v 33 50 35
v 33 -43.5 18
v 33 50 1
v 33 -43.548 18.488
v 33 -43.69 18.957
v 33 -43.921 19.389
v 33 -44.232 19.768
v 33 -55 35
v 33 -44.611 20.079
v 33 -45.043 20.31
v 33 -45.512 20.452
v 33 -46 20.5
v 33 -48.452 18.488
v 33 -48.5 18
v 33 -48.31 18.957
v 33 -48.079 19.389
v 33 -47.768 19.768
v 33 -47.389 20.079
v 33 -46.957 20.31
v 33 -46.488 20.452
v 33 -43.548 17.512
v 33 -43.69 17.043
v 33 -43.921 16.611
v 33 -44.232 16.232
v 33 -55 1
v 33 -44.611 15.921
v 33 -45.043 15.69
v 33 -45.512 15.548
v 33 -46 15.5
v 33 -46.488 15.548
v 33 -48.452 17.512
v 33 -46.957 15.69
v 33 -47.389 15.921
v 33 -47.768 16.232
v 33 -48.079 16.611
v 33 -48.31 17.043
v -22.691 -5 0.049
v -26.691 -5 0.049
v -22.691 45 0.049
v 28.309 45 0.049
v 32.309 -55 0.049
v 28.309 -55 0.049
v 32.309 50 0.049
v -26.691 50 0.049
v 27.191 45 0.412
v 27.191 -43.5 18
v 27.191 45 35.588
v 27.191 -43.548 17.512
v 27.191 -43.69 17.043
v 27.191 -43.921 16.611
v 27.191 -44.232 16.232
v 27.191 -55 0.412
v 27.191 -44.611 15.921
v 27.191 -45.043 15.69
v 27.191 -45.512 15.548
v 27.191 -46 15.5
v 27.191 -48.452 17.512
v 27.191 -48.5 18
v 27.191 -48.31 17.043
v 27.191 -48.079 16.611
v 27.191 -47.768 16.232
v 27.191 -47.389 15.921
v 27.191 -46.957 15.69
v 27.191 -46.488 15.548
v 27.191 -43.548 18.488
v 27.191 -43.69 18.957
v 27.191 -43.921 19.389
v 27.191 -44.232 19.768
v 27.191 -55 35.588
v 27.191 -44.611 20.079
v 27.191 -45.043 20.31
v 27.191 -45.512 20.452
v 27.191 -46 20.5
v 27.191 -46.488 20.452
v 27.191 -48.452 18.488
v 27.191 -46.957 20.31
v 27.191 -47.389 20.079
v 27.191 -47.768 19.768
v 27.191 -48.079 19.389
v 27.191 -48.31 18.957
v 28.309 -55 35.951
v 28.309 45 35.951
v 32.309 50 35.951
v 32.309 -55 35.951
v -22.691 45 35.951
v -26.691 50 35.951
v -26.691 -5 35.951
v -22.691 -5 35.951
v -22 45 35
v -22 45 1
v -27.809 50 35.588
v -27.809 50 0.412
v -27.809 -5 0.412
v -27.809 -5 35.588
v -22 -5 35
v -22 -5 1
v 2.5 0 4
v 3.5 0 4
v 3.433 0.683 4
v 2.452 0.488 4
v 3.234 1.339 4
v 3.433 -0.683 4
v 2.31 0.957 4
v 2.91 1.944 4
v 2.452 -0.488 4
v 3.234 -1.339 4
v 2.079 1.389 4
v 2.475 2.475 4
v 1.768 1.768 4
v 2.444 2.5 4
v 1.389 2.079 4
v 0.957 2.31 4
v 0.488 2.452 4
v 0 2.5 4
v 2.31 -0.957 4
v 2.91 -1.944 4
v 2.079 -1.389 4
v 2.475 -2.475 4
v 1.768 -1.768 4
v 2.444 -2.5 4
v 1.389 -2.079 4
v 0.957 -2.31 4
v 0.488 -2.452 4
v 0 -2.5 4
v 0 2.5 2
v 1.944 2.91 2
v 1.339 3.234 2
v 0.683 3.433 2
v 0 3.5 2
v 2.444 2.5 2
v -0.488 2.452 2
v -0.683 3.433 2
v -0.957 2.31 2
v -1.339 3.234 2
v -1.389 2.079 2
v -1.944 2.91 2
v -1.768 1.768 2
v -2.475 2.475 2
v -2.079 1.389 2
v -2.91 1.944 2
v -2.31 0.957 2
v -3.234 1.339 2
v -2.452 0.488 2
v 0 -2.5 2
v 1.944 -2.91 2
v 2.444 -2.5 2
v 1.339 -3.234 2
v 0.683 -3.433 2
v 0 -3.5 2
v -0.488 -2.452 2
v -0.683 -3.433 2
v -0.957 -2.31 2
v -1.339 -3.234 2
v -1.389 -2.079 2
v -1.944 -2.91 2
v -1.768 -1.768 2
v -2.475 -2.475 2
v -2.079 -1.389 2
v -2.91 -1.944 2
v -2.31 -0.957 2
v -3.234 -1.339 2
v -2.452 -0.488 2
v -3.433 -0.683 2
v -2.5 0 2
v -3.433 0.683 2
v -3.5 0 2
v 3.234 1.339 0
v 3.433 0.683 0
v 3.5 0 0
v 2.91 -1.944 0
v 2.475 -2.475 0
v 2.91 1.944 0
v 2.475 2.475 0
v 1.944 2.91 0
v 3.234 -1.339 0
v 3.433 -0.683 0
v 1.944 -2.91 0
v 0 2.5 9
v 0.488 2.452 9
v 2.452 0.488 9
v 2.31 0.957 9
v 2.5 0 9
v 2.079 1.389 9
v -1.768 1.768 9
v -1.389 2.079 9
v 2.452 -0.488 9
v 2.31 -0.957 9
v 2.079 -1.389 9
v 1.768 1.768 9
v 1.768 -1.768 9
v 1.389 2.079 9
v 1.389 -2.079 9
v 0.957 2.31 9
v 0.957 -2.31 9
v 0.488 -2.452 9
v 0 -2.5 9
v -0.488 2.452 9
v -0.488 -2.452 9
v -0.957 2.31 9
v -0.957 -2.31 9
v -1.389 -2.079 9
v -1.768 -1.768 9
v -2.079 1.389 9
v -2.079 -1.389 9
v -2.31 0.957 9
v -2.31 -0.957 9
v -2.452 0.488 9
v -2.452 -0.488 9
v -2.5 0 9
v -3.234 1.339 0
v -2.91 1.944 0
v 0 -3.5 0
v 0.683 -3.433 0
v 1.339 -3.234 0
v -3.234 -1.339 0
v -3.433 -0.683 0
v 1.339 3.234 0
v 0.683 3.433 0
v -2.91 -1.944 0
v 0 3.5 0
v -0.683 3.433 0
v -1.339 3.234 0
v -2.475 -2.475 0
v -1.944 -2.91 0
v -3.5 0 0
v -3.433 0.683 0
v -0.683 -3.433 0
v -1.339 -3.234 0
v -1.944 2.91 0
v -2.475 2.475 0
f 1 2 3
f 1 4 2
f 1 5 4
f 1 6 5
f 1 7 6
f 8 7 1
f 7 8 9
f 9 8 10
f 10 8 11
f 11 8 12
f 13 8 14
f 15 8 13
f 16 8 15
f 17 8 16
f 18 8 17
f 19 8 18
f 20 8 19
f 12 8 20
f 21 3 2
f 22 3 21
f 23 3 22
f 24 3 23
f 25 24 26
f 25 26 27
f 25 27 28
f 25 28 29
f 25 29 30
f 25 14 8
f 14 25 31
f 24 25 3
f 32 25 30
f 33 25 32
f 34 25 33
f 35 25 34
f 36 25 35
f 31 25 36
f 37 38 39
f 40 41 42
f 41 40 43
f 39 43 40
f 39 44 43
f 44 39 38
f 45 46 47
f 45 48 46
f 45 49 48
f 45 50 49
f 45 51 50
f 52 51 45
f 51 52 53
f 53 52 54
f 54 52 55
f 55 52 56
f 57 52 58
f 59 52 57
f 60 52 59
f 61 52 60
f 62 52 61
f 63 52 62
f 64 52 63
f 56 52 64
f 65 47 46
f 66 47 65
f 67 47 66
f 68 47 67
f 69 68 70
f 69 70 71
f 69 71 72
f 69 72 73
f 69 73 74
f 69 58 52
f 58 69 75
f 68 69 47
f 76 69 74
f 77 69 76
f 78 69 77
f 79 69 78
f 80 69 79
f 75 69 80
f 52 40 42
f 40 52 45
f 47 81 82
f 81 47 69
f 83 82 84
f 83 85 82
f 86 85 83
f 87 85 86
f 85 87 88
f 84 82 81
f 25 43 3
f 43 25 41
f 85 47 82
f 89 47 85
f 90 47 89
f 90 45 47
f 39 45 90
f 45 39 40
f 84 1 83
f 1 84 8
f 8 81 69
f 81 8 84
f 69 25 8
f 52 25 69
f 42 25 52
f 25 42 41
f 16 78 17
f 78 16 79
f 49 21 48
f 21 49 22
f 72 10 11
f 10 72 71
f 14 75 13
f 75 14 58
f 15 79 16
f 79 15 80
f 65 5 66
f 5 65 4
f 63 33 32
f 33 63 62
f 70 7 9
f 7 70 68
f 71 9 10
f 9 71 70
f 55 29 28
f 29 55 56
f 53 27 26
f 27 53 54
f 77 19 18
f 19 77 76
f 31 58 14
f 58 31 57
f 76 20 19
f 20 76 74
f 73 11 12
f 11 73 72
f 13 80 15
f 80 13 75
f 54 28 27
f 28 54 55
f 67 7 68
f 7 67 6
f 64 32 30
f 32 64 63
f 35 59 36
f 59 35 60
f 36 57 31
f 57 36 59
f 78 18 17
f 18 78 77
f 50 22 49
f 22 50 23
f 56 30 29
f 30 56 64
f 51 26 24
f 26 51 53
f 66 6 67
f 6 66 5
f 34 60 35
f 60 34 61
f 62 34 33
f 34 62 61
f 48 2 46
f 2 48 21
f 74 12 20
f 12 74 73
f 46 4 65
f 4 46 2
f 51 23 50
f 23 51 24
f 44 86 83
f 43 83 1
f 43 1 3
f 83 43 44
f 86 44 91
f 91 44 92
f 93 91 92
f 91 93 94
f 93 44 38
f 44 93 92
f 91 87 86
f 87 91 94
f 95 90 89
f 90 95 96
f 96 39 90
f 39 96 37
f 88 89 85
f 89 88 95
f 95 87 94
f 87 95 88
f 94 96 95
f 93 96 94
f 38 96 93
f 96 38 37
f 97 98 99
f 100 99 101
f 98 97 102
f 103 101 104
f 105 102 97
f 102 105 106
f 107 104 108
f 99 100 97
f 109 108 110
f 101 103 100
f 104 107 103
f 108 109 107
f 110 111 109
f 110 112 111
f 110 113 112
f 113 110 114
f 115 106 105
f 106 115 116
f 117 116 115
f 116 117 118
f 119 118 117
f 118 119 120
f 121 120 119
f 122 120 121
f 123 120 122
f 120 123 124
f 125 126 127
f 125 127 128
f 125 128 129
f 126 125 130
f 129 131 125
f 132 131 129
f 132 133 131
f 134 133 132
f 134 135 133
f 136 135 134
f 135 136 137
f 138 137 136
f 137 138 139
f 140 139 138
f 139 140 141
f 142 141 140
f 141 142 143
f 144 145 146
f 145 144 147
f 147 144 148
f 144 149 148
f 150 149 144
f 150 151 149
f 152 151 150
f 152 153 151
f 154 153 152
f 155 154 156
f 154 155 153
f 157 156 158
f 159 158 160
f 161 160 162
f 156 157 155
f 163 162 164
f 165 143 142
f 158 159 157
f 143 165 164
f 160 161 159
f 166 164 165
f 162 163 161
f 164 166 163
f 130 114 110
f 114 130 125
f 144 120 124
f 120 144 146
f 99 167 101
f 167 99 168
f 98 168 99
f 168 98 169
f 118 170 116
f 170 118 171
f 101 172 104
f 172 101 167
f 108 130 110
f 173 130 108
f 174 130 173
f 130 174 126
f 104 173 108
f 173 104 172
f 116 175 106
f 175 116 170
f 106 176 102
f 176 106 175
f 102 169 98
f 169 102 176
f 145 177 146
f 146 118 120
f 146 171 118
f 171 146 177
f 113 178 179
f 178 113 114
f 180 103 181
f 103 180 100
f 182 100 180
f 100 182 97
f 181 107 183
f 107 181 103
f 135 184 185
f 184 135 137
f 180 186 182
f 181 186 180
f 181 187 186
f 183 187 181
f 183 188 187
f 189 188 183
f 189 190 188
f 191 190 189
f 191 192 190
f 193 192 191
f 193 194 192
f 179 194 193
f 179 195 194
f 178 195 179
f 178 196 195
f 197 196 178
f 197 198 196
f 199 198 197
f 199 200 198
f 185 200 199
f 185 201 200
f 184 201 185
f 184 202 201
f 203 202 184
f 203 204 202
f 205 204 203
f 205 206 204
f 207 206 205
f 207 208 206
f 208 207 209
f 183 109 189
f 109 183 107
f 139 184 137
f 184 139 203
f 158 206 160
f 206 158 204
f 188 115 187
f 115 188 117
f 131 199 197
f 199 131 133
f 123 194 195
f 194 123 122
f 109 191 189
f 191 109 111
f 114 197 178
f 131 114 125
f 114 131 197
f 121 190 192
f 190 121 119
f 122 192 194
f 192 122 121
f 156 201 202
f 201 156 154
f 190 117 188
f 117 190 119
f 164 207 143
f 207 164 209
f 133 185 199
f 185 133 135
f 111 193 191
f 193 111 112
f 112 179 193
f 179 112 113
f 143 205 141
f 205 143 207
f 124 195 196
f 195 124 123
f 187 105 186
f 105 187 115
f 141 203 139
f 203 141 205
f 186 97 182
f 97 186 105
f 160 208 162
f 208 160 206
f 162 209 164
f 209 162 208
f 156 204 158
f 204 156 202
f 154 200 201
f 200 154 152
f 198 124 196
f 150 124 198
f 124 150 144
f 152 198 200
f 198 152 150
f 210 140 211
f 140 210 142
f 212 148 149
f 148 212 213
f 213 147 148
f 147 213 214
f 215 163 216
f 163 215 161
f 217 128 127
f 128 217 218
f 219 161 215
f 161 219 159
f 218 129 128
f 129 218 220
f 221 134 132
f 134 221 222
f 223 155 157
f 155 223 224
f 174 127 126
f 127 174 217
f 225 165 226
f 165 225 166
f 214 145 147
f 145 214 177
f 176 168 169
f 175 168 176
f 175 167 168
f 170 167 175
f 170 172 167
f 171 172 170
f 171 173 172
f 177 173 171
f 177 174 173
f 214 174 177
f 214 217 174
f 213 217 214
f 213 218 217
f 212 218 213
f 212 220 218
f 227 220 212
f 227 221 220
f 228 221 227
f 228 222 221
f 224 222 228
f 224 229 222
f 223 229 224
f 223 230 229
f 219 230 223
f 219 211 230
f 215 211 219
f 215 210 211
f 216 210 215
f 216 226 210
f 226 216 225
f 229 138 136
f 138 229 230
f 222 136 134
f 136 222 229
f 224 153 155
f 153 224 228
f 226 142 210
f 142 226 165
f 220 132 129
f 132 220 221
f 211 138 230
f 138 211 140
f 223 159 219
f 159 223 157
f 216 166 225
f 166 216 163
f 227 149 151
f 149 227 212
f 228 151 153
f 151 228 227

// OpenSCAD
// preview[view:south west, tilt:top diagonal]

/* [General Settings] */
// How thick is the cubical wall?
wall_thickness = 50;//[15:75]

// How long should the back side be?
back_height = 50;//[15:100]

// How long should the front side be?
front_height = 100;//[30:150]

// Adjust the resolution
resolution = 32;//[16:36]
$cf=resolution;

// How wide should the hanger be?
hanger_width = 35;//[5:75]

// How thick should the plastic be?
hanger_thickness = 5;//[2:10]

/* [Hook Settings] */
// Diameter of the hook (this should be smaller than the hole for clearance).
hook_diameter = 7;//[1:25]

// Thickness of the hook (shallower than hole depth for clearance).
hook_depth = 2;//[1:10]

// Diameter of the bar (this should be smaller than the smallest part of the hole for clearance).
bar_diameter = 5;//[1:20]

// Length of the hook bar (slightly larger than keyhole material thickness).
bar_depth = 2;//[1:10]

/* [Hidden] */

edge_radius = 1;

main(); //runs program

module main(){

	translate( [-wall_thickness / 2, front_height / 2, hanger_width / 2 + edge_radius / 2] ) rotate( a=[ 90, 0, 0] ) {
		//Top
		translate( [( wall_thickness + hanger_thickness ) / 2, 0, 0] ) {
			roundedRect( size = [( wall_thickness + 2 * hanger_thickness ), hanger_width, hanger_thickness], radius = edge_radius );
		}

		//Back
		translate( [0, 0, hanger_thickness] ) {
			roundedRect( size = [hanger_thickness, hanger_width, back_height], radius = edge_radius );
		}

		//Front
		difference() {
			translate( [( wall_thickness + hanger_thickness ), 0, hanger_thickness] ) roundedRect( size = [hanger_thickness, hanger_width, front_height], radius = edge_radius );
			translate( [( wall_thickness + 1.5 * hanger_thickness + hook_depth + bar_depth ), 0, ( front_height - ( hook_diameter / 2 ) + hook_depth - 0.5 * hanger_thickness )] ) rotate(a=[0, 270, 0]) cylinder( h = bar_depth + 2 * hanger_thickness, r = ( bar_diameter / 2 ), $fn = $cf );
		}
	}

	//Hooks
	drawHook();
}

module drawHook() {

	large_radius = ( hook_diameter / 2 );
	small_radius = ( bar_diameter / 2 );

	cylinder( h = hook_depth, r1 = large_radius, r2 = large_radius, $fn = $cf );

	translate( [ 0, 0, hook_depth ] ) {

		cylinder( h = bar_depth + hanger_thickness, r1 = small_radius, r2 = small_radius, $fn = $cf );

		intersection() {

			translate( [0, -small_radius, 0] ) {
				cube( [hook_diameter, bar_diameter, bar_depth] );
			}

			cylinder( h = bar_depth, r1 = large_radius, r2 = large_radius, $fn = $cf );
		}
	}
}

module roundedRect( size, radius ) {

	x = size[0];
	y = size[1];
	z = size[2];

	linear_extrude( height = z )

	hull() {

		// place 4 circles in the corners, with the given radius
		translate( [( -x / 2 ) + ( radius / 2 ), ( -y / 2 ) + ( radius / 2 ), 0] ) circle( r = radius );

		translate( [( x / 2 ) - ( radius / 2 ), ( -y / 2 ) + ( radius / 2 ), 0] ) circle( r = radius );

		translate( [( -x / 2 ) + ( radius / 2 ), ( y / 2 ) - ( radius / 2 ), 0] ) circle( r = radius );

		translate( [( x / 2 ) - ( radius / 2 ), ( y / 2 ) - ( radius / 2 ), 0] ) circle( r = radius );
	}
}
